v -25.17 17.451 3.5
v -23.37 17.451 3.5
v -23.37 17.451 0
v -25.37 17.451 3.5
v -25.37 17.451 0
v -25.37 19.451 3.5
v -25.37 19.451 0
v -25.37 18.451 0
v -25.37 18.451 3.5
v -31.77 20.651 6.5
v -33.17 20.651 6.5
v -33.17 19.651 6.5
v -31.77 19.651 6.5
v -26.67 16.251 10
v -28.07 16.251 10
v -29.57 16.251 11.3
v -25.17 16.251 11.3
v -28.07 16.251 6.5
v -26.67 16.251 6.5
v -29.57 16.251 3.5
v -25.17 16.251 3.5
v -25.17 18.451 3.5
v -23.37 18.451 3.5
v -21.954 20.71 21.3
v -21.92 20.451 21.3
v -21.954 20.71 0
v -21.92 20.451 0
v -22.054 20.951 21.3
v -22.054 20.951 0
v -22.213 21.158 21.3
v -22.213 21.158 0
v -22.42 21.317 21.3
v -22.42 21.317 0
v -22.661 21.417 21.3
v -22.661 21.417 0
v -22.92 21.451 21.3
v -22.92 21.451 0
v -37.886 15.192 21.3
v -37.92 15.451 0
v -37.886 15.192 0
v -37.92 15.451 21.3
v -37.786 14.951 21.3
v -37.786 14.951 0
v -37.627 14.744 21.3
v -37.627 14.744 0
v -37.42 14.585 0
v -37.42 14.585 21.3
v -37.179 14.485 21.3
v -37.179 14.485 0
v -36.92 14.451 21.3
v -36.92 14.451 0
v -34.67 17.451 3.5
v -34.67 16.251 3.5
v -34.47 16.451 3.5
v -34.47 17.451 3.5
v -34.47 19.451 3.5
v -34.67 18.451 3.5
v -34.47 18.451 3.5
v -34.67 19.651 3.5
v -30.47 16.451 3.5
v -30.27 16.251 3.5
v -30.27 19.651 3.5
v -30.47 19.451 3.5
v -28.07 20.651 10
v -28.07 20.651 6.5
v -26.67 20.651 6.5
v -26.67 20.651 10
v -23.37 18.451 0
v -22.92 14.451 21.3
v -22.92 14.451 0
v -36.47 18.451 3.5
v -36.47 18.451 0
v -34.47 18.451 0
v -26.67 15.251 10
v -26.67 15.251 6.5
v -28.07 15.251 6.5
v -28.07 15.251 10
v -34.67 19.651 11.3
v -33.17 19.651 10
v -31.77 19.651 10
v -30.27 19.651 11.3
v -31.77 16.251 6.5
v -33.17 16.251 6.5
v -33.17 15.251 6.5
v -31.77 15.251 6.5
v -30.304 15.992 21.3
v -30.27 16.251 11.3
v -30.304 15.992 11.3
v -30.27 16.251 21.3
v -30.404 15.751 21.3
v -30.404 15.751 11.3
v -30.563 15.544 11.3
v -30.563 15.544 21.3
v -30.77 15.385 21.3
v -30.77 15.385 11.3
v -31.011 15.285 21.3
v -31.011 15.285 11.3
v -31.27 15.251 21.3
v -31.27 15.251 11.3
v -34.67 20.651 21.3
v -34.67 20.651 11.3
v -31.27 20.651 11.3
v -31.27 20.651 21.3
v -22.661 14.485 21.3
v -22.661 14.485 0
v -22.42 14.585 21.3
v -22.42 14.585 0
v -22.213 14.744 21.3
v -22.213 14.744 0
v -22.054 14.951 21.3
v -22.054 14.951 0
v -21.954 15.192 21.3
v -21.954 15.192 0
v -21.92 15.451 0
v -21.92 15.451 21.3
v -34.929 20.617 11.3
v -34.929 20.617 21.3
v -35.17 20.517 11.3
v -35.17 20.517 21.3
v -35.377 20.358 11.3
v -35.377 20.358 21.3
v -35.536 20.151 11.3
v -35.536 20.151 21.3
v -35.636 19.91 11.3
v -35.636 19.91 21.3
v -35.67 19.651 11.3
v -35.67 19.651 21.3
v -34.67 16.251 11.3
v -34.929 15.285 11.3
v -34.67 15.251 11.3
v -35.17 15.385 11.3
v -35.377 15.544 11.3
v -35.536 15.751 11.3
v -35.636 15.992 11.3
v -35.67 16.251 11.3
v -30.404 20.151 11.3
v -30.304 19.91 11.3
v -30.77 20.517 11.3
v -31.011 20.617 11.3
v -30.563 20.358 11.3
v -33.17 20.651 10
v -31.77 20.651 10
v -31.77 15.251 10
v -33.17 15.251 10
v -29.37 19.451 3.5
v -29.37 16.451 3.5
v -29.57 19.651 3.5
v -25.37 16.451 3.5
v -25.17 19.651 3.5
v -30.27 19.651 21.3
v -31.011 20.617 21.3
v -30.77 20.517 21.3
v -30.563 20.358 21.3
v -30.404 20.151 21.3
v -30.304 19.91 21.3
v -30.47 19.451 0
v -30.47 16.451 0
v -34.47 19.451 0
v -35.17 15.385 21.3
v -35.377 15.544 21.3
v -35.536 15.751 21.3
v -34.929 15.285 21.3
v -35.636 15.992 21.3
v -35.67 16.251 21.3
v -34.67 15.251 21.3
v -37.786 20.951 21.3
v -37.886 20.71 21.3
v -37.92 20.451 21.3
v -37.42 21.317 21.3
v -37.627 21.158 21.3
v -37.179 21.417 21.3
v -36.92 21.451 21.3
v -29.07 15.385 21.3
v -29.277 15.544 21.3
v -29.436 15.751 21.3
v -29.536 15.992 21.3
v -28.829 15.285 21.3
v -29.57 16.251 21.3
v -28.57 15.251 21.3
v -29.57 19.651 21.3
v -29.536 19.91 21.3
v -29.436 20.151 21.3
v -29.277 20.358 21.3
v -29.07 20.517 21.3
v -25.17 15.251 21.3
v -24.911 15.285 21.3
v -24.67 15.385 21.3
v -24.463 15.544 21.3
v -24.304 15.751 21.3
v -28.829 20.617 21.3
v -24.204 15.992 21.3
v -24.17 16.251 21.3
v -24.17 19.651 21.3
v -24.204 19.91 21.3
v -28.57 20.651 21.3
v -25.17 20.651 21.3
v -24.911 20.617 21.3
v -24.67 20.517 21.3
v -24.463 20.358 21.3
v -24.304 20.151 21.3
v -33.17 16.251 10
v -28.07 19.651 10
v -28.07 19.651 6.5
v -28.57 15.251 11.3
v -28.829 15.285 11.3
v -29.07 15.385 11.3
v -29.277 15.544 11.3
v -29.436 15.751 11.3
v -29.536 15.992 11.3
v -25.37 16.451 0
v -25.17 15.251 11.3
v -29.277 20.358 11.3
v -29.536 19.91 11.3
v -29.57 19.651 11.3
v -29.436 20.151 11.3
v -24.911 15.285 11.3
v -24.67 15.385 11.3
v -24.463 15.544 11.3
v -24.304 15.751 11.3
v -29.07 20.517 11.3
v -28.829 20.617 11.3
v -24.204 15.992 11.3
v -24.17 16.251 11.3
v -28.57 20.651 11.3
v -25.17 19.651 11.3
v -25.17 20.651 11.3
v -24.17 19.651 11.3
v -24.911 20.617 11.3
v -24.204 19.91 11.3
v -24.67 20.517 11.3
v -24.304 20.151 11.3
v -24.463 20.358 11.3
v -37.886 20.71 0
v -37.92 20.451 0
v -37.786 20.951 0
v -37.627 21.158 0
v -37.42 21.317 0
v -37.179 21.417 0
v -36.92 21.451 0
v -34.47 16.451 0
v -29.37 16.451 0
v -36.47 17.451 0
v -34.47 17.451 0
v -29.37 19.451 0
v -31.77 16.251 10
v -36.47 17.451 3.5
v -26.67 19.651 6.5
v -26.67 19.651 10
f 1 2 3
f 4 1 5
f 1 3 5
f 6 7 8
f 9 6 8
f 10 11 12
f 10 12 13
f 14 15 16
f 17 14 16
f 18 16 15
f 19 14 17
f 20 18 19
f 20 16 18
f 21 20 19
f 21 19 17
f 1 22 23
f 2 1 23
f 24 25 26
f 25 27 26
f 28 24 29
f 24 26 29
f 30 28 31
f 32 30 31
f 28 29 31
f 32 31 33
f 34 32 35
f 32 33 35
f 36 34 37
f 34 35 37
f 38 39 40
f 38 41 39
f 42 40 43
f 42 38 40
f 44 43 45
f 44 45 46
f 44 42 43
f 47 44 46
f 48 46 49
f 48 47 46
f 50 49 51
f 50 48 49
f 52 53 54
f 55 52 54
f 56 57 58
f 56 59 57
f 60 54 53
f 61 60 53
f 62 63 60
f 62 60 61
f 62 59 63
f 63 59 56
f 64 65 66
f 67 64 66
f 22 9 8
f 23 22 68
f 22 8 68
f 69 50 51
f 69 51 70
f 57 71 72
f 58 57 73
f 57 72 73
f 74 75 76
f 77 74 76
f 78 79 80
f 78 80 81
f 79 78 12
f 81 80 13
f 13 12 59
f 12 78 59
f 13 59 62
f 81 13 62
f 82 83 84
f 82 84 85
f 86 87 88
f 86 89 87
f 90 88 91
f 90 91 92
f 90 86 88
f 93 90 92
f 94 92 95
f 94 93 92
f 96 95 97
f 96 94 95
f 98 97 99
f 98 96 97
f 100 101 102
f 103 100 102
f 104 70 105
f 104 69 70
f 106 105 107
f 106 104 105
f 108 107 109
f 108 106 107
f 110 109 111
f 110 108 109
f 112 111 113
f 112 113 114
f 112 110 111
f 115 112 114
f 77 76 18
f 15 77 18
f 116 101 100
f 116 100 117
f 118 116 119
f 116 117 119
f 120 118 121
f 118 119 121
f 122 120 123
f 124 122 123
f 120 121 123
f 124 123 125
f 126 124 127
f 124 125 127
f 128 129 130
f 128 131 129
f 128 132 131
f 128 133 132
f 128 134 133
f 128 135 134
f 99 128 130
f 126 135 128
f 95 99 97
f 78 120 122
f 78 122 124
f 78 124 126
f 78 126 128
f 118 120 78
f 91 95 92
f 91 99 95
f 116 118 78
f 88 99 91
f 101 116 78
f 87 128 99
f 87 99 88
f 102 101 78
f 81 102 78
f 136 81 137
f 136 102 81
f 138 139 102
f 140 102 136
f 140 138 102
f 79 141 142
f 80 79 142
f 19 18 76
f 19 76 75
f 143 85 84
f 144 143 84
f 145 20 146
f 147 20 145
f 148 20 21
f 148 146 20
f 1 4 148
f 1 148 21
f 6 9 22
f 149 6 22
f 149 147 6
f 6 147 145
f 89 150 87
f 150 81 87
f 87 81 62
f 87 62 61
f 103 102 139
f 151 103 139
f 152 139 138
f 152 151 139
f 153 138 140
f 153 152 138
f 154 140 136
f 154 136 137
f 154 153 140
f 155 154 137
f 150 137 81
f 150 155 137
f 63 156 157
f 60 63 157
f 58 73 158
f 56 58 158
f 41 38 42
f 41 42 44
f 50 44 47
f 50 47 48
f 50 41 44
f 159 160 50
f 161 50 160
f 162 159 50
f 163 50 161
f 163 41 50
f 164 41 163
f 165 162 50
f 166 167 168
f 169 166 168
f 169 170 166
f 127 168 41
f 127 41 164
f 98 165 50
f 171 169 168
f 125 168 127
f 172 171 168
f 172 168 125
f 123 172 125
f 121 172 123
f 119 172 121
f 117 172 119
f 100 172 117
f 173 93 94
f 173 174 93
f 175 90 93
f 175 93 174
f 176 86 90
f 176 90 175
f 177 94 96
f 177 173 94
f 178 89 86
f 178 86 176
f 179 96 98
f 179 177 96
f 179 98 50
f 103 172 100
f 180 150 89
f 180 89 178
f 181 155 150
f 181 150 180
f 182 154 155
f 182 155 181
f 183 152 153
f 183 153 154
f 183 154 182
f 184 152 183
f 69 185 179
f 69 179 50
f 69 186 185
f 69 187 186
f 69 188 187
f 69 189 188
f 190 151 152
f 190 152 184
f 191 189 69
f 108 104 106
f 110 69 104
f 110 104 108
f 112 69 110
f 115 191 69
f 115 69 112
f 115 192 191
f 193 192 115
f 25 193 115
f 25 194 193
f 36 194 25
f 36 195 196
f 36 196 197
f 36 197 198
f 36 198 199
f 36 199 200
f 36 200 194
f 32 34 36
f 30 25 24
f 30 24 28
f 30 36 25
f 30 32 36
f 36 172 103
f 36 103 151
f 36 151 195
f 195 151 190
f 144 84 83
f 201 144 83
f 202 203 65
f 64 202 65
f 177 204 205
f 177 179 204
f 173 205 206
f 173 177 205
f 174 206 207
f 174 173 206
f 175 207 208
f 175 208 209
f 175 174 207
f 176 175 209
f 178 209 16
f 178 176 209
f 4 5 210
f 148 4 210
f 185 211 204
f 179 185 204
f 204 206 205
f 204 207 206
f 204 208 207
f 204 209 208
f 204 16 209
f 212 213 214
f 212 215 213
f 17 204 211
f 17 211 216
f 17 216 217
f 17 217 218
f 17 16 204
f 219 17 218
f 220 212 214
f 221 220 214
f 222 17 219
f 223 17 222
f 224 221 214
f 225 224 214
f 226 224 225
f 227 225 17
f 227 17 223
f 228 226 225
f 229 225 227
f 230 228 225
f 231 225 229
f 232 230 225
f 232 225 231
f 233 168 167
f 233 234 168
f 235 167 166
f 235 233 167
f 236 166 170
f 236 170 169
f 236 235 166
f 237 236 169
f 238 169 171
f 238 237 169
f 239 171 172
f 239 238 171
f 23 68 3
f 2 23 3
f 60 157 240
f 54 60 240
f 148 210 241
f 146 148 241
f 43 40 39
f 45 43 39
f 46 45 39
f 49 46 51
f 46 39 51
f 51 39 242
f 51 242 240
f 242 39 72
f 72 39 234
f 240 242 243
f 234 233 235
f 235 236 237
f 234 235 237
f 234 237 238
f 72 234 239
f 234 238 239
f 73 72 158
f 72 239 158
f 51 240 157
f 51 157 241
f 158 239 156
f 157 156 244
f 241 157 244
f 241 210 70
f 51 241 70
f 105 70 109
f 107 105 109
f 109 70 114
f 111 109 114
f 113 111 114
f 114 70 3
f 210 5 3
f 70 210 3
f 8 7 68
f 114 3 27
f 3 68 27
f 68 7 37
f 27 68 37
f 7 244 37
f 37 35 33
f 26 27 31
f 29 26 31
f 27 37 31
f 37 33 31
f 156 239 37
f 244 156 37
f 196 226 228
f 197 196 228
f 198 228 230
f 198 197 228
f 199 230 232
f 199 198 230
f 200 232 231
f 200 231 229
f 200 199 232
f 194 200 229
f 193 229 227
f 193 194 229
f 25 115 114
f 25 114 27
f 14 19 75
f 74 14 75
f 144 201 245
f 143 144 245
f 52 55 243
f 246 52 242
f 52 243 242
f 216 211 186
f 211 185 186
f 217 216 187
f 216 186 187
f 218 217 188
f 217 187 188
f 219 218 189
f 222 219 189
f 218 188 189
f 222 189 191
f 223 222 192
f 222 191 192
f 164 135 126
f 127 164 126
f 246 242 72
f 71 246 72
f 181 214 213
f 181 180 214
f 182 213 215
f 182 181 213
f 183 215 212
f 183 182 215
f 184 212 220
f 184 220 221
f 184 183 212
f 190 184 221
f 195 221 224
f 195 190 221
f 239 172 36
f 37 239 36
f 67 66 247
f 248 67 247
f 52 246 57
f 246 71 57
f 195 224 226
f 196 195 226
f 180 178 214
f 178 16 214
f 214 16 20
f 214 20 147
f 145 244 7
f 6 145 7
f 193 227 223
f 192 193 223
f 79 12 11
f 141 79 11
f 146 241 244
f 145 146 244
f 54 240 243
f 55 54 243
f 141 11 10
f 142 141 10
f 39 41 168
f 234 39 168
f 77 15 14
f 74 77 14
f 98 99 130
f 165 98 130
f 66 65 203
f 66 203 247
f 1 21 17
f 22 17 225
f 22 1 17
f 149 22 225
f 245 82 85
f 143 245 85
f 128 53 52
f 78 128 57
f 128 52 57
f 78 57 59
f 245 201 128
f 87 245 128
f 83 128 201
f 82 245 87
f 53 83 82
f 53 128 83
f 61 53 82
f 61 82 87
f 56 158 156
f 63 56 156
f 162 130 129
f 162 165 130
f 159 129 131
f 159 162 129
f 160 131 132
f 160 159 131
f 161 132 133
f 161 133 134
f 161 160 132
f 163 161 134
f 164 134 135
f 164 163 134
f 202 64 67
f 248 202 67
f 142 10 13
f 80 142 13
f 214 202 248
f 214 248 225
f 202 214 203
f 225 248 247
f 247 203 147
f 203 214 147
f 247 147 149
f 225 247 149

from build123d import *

# Parameters (mm, degrees)
F0_W     = 8
F0_H     = 7
F1_DEPTH = 3.5
F2_W     = 8
F2_H     = 7
F2_W_2   = 4.4
F2_H_2   = 3.4
F3_DEPTH = 3
F4_W     = 8
F4_H     = 7
F5_DEPTH = 3.5
F6_W     = 16
F6_H     = 7
F6_W_2   = 4.4
F6_H_2   = 3.4
F7_DEPTH = 1.3
F8_W     = 16
F8_H     = 7
F9_DEPTH = 10
F10_R    = 1
F11_R    = 1


with BuildPart() as f1:
    # F0 (on Top) → F1 (new body)
    with BuildSketch(Plane.XY):
        with Locations((-33.920105, 17.951032)):
            Rectangle(F0_W, F0_H)
        Polygon((-34.470105, 19.451032), (-30.470105, 19.451032), (-30.470105, 16.451032), (-34.470105, 16.451032), (-34.470105, 17.451032), (-36.470105, 17.451032), (-36.470105, 18.451032), (-34.470105, 18.451032), align=None, mode=Mode.SUBTRACT)
        Polygon((-29.370105, 21.451032), (-29.920105, 21.451032), (-29.920105, 14.451032), (-21.920105, 14.451032), (-21.920105, 21.451032), (-23.370105, 21.451032), (-25.370105, 21.451032), align=None)
        Polygon((-29.370105, 16.451032), (-29.370105, 19.451032), (-25.370105, 19.451032), (-25.370105, 18.451032), (-23.370105, 18.451032), (-23.370105, 17.451032), (-25.370105, 17.451032), (-25.370105, 16.451032), align=None, mode=Mode.SUBTRACT)
    extrude(amount=F1_DEPTH)

    # F2 (on face) → F3 (join)
    with BuildSketch(Plane.XY.offset(3.5)):
        with Locations((-33.920105, 17.951032)):
            Rectangle(F2_W, F2_H)
        with Locations((-32.470105, 17.951032)):
            Rectangle(F2_W_2, F2_H_2, mode=Mode.SUBTRACT)
        with Locations((-25.920105, 17.951032)):
            Rectangle(F2_W, F2_H)
        with Locations((-27.370105, 17.951032)):
            Rectangle(F2_W_2, F2_H_2, mode=Mode.SUBTRACT)
    extrude(amount=F3_DEPTH)

    # F4 (on face) → F5 (join)
    with BuildSketch(Plane.XY.offset(6.5)):
        with Locations((-25.920105, 17.951032)):
            Rectangle(F4_W, F4_H)
        Polygon((-28.070105, 19.651032), (-28.070105, 20.651032), (-27.370105, 20.651032), (-26.670105, 20.651032), (-26.670105, 19.651032), (-25.170105, 19.651032), (-25.170105, 16.251032), (-26.670105, 16.251032), (-26.670105, 15.251032), (-27.370105, 15.251032), (-28.070105, 15.251032), (-28.070105, 16.251032), (-29.570105, 16.251032), (-29.570105, 19.651032), align=None, mode=Mode.SUBTRACT)
        with Locations((-33.920105, 17.951032)):
            Rectangle(F4_W, F4_H)
        Polygon((-34.670105, 17.951032), (-34.670105, 19.651032), (-33.170105, 19.651032), (-33.170105, 20.651032), (-32.470105, 20.651032), (-31.770105, 20.651032), (-31.770105, 19.651032), (-30.270105, 19.651032), (-30.270105, 17.951032), (-30.270105, 16.251032), (-31.770105, 16.251032), (-31.770105, 15.251032), (-32.470105, 15.251032), (-33.170105, 15.251032), (-33.170105, 16.251032), (-34.670105, 16.251032), align=None, mode=Mode.SUBTRACT)
    extrude(amount=F5_DEPTH)

    # F6 (on face) → F7 (join)
    with BuildSketch(Plane.XY.offset(10)):
        with Locations((-29.920105, 17.951032)):
            Rectangle(F6_W, F6_H)
        with Locations((-32.470105, 17.951032)):
            Rectangle(F6_W_2, F6_H_2, mode=Mode.SUBTRACT)
        with Locations((-27.370105, 17.951032)):
            Rectangle(F6_W_2, F6_H_2, mode=Mode.SUBTRACT)
    extrude(amount=F7_DEPTH)

    # F8 (on face) → F9 (join)
    with BuildSketch(Plane.XY.offset(11.3)):
        with Locations((-29.920105, 17.951032)):
            Rectangle(F8_W, F8_H)
        Polygon((-30.270105, 20.651032), (-30.270105, 19.651032), (-30.270105, 16.251032), (-30.270105, 15.251032), (-35.670105, 15.251032), (-35.670105, 20.651032), align=None, mode=Mode.SUBTRACT)
        Polygon((-29.570105, 15.251032), (-29.570105, 16.251032), (-29.570105, 19.651032), (-29.570105, 20.651032), (-24.170105, 20.651032), (-24.170105, 15.251032), align=None, mode=Mode.SUBTRACT)
    extrude(amount=F9_DEPTH)

    # F10
    f10_edges = [f1.edges().sort_by_distance(p)[0] for p in [
        (-37.920105, 14.451032, 10.65),
        (-21.920105, 14.451032, 10.65),
        (-37.920105, 21.451032, 10.65),
        (-21.920105, 21.451032, 10.65),
    ]]
    fillet(f10_edges, radius=F10_R)

    # F11
    f11_edges = [f1.edges().sort_by_distance(p)[0] for p in [
        (-24.170105, 15.251032, 16.3),
        (-30.270105, 15.251032, 16.3),
        (-35.670105, 15.251032, 16.3),
        (-29.570105, 15.251032, 16.3),
        (-24.170105, 20.651032, 16.3),
        (-30.270105, 20.651032, 16.3),
        (-29.570105, 20.651032, 16.3),
        (-35.670105, 20.651032, 16.3),
    ]]
    fillet(f11_edges, radius=F11_R)


solid = f1.part
